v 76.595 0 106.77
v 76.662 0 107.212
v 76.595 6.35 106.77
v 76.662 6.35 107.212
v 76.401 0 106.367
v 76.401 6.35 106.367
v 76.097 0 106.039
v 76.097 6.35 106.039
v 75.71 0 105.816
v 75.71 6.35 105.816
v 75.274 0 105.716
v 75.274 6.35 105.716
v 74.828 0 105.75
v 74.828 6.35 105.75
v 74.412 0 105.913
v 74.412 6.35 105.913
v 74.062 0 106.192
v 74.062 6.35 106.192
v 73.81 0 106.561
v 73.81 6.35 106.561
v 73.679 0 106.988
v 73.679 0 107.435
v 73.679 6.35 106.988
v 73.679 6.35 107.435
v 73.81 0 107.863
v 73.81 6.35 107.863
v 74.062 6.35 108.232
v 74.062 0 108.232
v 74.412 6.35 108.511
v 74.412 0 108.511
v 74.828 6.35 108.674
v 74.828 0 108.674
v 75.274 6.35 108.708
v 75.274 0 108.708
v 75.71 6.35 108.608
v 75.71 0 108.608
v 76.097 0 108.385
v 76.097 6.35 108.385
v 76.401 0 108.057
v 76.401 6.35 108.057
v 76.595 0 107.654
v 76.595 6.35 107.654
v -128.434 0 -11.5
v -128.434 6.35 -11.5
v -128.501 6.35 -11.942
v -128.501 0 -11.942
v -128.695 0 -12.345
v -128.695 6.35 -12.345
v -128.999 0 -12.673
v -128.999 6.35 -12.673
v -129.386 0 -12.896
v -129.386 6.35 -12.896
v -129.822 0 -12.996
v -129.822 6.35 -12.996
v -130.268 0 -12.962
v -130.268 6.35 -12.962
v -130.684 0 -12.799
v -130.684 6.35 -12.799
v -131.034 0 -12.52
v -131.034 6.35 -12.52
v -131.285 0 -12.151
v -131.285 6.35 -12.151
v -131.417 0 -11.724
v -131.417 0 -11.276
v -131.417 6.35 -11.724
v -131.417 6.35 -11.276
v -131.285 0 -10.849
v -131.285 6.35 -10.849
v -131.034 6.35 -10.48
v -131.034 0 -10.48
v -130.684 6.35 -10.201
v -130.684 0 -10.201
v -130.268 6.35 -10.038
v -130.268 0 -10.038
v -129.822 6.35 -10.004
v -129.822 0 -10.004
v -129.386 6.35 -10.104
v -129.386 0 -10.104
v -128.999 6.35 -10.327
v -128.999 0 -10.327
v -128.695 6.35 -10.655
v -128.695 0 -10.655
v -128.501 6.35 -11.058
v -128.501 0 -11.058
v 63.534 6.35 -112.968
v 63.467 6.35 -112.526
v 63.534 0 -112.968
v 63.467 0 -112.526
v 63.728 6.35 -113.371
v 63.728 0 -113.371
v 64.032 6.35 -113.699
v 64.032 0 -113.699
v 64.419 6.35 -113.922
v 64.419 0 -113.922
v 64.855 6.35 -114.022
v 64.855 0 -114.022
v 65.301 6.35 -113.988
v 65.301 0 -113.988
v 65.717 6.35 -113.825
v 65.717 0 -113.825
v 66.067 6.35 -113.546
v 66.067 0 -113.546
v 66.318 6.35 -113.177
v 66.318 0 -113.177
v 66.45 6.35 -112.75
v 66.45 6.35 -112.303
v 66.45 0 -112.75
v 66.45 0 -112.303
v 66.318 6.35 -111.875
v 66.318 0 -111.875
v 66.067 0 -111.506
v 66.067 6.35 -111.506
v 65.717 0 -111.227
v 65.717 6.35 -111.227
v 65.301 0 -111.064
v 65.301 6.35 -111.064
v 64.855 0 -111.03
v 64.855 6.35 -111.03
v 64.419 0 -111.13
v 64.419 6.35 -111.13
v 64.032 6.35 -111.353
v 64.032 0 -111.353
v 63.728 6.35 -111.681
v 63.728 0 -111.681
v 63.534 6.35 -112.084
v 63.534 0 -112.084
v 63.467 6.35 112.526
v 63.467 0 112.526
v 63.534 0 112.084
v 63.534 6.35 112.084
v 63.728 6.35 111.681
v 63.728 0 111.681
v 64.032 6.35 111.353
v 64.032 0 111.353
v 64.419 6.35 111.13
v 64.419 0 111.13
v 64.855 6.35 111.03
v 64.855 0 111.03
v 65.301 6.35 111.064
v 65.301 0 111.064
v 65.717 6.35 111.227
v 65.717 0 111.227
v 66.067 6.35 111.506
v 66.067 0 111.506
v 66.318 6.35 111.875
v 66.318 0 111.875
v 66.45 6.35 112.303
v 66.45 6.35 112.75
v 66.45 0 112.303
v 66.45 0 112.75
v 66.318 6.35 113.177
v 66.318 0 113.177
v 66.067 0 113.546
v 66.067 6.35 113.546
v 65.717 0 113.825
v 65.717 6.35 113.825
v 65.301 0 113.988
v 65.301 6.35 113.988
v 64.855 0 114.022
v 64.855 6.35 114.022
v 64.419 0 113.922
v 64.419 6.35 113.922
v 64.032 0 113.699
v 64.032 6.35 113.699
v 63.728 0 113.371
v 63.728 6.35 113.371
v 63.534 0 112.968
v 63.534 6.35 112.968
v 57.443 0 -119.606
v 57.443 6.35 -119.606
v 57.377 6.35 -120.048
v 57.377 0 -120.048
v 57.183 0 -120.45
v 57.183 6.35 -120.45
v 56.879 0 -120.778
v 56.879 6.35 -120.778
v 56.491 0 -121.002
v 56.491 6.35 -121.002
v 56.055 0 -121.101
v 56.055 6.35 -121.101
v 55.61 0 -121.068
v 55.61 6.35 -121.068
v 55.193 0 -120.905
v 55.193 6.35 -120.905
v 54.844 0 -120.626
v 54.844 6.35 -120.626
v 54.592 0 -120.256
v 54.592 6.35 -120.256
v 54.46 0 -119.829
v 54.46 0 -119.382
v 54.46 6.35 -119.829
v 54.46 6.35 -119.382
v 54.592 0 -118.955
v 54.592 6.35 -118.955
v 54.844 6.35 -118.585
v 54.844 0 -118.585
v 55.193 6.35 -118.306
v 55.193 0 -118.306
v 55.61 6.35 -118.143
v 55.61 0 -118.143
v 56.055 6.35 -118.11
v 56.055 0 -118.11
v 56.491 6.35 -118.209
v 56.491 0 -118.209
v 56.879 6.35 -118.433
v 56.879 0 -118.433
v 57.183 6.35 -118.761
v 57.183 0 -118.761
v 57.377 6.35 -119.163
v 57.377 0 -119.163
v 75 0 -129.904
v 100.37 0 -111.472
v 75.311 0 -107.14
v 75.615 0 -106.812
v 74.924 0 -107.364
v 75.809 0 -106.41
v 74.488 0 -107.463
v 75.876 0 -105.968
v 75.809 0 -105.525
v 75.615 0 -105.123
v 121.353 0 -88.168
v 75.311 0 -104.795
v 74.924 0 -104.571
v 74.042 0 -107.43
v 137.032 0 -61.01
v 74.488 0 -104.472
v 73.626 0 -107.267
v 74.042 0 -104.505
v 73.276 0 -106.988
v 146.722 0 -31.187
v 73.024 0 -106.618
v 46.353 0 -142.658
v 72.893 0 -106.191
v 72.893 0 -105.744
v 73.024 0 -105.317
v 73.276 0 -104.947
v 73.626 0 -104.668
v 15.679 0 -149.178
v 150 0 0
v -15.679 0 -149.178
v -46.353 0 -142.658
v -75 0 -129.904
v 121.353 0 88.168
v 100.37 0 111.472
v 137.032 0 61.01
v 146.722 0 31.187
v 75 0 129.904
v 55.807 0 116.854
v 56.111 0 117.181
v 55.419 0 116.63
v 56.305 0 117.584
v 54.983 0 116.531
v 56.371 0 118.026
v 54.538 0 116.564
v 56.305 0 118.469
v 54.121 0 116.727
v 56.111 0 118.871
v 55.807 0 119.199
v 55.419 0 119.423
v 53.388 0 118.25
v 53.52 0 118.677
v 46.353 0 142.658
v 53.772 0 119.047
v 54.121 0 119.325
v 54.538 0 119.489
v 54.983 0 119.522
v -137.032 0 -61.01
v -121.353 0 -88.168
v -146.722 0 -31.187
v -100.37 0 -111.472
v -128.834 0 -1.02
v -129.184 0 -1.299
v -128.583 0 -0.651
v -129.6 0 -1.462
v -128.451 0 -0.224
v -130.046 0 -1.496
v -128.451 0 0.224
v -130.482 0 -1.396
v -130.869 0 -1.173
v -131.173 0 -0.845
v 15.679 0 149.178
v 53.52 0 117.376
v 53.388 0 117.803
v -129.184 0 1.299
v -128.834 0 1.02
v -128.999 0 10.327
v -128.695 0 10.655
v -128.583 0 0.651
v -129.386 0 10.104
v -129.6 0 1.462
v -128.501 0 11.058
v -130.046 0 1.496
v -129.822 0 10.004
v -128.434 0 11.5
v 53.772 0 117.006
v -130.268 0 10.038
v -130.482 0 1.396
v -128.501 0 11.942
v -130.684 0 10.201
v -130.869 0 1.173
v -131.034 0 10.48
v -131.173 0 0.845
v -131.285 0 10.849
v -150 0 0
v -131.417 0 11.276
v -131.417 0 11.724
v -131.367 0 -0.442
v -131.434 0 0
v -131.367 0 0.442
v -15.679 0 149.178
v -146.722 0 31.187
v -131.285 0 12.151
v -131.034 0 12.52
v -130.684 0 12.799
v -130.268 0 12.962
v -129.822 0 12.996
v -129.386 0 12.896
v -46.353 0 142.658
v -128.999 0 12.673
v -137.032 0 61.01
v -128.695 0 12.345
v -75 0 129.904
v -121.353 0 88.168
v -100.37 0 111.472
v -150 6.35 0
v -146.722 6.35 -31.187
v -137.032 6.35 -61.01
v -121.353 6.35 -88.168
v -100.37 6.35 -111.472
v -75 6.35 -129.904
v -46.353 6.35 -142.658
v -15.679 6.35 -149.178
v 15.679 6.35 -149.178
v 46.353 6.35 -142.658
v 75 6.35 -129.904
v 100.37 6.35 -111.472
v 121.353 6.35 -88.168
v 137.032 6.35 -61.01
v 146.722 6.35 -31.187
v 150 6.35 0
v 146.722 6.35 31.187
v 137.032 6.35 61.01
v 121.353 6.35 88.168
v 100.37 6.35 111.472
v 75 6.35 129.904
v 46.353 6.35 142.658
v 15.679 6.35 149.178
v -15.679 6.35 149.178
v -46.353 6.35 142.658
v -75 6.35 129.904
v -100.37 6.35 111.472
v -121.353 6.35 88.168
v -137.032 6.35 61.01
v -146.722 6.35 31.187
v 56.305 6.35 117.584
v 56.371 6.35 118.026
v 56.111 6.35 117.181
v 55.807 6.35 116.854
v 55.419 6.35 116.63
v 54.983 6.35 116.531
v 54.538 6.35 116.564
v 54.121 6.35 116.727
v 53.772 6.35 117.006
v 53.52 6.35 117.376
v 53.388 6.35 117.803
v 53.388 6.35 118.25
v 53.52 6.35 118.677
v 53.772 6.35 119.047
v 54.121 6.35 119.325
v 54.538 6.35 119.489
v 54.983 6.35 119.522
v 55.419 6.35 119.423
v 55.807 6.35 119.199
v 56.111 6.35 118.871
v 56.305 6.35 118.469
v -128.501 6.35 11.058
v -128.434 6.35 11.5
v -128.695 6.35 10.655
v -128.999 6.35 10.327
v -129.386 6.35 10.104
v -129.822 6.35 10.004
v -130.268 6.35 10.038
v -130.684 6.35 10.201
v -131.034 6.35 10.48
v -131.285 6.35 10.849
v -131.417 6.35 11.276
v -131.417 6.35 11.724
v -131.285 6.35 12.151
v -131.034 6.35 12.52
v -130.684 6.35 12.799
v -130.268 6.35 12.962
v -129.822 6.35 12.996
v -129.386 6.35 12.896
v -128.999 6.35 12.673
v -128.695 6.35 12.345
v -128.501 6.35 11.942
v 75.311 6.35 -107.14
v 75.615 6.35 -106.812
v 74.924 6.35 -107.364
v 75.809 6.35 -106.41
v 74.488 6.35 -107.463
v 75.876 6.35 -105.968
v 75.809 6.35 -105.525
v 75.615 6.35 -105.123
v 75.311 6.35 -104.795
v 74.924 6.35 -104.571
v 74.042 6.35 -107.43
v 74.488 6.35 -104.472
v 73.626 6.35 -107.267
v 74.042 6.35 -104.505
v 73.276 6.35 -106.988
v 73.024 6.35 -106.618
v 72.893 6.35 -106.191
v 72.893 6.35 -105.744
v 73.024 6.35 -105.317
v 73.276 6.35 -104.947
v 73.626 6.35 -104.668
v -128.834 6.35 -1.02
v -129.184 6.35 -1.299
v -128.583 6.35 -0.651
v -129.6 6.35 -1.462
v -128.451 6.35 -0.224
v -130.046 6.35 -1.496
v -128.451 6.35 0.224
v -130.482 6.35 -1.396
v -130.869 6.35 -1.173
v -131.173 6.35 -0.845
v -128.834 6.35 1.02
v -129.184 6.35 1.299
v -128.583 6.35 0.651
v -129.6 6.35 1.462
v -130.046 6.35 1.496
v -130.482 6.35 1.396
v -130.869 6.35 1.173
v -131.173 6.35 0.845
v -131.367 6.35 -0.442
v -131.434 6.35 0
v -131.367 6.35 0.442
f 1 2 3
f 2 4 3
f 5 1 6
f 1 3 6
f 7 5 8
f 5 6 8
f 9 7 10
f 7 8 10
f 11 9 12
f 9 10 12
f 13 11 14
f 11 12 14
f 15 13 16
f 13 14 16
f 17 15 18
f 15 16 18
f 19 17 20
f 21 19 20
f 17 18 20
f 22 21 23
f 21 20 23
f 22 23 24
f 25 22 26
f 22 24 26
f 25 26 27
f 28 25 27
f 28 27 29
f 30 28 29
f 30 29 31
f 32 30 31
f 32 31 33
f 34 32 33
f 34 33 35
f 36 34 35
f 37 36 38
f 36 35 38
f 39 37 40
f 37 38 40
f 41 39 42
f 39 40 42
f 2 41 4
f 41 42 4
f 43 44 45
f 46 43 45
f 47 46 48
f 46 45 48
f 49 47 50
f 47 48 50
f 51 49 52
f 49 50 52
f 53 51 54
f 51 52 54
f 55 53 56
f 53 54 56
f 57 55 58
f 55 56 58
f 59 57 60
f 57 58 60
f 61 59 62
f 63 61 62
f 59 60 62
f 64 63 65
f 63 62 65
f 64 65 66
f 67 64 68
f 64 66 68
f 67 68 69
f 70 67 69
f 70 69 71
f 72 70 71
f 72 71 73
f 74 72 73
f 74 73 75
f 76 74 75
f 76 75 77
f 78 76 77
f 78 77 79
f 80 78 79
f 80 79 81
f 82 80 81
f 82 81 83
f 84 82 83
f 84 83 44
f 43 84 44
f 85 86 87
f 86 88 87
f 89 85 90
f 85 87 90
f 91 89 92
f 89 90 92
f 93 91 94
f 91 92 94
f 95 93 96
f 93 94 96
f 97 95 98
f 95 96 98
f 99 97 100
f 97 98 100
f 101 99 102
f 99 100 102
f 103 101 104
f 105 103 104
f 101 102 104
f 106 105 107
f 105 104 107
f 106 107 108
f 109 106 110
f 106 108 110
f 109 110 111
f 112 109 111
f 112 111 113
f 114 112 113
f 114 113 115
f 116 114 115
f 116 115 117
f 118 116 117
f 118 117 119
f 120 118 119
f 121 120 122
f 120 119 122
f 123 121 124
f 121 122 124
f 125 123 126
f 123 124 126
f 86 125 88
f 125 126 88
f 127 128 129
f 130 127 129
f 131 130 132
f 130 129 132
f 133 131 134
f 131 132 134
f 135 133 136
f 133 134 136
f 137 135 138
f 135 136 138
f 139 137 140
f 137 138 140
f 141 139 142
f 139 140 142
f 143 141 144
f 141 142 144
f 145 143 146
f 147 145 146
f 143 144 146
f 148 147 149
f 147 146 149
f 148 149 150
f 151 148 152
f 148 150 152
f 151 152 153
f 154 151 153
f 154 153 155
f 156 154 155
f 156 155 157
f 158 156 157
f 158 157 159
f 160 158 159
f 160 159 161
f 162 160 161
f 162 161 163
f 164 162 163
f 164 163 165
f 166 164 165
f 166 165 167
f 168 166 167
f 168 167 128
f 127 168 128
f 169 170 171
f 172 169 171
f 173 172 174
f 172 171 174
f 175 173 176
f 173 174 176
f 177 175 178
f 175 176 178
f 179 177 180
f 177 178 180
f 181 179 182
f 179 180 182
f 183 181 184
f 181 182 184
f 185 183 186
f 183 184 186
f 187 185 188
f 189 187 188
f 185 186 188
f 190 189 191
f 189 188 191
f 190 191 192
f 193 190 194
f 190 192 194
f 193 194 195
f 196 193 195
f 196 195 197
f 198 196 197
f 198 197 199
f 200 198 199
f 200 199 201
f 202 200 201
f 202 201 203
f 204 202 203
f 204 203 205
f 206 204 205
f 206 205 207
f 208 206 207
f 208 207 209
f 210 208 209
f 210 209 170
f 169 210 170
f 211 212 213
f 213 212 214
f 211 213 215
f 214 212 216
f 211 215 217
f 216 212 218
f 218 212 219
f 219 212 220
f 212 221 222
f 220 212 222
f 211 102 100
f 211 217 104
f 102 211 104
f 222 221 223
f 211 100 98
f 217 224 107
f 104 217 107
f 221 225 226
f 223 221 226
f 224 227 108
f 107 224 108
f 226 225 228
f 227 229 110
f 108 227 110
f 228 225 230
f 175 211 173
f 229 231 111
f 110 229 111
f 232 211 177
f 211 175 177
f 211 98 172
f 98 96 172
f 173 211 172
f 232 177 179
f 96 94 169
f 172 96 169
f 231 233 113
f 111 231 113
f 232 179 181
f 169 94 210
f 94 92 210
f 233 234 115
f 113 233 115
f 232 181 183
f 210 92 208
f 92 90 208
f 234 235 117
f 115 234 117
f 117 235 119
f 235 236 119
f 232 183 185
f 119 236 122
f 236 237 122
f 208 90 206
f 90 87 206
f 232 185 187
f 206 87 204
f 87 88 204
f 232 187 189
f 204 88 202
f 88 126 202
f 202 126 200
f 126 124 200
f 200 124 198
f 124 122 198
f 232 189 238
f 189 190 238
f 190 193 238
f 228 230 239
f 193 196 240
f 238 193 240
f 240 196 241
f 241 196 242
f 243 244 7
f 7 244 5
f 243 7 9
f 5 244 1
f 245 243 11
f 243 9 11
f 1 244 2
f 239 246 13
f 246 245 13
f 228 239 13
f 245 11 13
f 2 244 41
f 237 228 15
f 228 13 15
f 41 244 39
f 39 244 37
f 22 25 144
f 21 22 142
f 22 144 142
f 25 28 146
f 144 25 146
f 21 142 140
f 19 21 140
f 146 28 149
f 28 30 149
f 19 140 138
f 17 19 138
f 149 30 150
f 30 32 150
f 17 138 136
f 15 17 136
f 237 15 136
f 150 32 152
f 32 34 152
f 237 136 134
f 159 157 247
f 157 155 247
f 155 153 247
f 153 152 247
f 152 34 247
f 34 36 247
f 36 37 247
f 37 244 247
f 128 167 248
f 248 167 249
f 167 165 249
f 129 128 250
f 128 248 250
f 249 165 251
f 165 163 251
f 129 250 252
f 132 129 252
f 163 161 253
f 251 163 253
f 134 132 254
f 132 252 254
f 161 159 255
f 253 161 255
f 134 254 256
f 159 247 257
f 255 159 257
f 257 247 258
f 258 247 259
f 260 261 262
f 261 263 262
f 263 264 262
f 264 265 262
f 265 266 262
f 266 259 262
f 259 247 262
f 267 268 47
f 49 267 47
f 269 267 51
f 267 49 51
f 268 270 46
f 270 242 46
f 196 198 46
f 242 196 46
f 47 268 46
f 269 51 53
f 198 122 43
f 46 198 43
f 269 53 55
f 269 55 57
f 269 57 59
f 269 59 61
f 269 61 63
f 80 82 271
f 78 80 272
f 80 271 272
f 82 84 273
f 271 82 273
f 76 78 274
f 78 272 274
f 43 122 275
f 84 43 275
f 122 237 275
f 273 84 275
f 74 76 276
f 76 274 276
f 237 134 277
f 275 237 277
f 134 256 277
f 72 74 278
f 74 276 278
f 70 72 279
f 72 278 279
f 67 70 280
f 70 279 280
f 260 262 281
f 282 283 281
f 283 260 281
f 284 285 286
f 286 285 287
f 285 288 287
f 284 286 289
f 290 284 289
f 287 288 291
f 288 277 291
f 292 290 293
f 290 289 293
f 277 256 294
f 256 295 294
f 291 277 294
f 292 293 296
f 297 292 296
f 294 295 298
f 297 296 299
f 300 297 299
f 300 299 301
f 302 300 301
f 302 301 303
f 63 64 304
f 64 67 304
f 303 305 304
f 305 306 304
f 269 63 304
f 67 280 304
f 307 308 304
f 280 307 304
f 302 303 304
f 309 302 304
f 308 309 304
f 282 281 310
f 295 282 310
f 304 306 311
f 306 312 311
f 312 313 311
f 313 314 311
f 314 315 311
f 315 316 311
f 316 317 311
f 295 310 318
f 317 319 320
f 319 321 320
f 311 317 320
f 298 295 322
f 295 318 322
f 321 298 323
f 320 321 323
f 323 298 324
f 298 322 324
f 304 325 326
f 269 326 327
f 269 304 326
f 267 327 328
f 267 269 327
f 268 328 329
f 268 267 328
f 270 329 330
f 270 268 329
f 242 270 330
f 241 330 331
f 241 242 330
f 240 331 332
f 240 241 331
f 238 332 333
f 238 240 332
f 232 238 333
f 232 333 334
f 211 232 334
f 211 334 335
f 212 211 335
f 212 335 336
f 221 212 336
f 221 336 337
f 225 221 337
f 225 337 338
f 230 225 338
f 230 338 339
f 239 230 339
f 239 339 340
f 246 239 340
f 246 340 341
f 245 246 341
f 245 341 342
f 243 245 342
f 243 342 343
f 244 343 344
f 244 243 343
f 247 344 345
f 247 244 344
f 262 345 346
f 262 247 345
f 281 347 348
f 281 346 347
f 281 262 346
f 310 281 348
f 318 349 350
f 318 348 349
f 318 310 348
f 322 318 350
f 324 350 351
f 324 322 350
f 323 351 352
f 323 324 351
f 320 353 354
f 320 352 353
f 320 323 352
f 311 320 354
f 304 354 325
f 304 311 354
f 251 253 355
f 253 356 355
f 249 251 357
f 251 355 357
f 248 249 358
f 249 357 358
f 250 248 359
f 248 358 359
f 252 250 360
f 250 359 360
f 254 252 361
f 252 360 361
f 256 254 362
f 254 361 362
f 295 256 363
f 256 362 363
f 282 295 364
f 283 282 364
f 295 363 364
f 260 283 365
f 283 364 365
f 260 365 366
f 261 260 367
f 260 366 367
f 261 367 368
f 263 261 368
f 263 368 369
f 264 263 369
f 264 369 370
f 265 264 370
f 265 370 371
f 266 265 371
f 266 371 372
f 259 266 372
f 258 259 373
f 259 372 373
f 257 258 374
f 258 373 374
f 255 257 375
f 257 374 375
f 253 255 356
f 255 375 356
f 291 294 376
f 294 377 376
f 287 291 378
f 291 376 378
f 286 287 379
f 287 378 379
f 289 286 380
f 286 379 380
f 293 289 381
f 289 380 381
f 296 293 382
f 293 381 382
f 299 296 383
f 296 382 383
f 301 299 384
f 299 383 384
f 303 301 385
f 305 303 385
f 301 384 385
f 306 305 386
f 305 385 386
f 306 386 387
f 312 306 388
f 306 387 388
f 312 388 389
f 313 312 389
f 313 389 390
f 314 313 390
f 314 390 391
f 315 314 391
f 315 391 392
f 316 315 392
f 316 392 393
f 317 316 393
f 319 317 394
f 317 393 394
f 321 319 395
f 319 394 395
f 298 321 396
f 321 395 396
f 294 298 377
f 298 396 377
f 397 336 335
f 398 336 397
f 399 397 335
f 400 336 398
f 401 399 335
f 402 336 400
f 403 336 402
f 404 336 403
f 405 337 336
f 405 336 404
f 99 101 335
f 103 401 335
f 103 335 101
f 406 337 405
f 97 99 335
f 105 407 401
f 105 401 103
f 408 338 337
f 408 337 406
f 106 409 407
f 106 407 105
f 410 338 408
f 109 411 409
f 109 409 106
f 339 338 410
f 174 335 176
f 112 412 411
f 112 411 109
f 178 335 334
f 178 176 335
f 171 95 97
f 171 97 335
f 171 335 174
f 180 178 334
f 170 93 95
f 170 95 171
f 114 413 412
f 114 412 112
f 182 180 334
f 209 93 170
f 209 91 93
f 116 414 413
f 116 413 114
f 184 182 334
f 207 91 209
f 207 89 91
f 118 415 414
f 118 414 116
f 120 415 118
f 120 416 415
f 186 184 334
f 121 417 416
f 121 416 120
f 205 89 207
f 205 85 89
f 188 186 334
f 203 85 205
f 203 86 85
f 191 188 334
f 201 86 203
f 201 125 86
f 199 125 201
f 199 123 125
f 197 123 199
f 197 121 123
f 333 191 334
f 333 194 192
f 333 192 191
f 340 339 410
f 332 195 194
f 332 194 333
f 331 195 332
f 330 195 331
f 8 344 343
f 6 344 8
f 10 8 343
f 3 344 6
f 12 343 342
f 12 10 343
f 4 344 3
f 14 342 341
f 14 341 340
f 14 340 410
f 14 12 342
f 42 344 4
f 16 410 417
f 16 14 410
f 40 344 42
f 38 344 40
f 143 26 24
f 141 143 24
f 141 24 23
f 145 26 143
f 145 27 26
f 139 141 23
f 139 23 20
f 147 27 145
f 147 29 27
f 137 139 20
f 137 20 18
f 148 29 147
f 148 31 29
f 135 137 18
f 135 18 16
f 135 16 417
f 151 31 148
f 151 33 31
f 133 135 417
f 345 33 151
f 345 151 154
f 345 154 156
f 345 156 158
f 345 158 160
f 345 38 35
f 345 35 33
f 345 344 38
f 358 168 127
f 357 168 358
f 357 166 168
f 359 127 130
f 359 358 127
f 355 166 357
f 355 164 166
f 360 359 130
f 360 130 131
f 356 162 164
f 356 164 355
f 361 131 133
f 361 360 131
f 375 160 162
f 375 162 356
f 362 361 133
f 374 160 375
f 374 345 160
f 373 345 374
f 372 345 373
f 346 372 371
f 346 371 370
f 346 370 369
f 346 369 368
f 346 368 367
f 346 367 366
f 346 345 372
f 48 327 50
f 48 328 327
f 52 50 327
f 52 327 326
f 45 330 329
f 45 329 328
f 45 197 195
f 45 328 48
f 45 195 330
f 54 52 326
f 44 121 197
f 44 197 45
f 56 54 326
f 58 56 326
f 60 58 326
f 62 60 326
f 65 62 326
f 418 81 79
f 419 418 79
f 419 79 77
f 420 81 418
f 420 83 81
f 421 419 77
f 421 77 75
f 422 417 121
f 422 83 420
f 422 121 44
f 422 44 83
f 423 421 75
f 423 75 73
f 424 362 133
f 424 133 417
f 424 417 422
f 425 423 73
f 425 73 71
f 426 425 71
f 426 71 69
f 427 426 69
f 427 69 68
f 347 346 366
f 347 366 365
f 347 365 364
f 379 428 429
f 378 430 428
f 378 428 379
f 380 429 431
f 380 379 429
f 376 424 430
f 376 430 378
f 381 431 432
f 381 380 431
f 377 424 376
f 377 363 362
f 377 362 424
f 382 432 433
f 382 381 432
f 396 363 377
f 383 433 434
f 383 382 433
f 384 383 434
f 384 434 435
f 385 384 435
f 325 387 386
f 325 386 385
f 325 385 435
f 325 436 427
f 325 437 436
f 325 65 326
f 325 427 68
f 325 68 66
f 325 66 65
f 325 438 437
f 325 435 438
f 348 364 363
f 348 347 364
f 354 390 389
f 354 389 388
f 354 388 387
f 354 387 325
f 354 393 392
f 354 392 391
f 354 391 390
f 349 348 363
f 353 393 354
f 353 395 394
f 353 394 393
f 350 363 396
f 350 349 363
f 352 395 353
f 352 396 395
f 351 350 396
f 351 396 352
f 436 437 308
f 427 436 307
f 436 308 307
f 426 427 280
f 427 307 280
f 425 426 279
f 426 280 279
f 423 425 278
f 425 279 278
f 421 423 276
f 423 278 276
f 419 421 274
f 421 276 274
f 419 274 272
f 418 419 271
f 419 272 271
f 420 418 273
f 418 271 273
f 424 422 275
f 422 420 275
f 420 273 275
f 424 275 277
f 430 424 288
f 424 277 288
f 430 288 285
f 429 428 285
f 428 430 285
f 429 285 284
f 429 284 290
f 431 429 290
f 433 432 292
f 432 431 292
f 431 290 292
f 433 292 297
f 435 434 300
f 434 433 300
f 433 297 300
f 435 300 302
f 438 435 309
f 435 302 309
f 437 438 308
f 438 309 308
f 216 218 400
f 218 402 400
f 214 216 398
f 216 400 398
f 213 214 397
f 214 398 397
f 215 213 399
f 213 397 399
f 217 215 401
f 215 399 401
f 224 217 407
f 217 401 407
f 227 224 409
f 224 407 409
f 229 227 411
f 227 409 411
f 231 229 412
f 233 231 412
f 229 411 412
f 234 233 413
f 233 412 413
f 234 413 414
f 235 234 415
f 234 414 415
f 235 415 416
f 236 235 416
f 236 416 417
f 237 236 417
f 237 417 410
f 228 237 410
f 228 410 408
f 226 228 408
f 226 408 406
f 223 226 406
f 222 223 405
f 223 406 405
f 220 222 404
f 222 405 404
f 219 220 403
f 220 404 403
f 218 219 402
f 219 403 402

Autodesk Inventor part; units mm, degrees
ref_plane "YZ Plane" through (0, 0, 0) normal (1, 0, 0) x (0, 1, 0)
ref_plane "XZ Plane" through (0, 0, 0) normal (0, 1, 0) x (-1, 0, 0)
ref_plane "XY Plane" through (0, 0, 0) normal (0, 0, 1) x (1, 0, 0)
sketch "Sketch1" plane through (0, 0, 0) normal (0, 1, 0) x (-1, 0, 0)
  circle A0 centre (0, 0) radius 150
  line L0 (150, 0) -> (0, 0)
  line L1 (0, 0) -> (-75, -129.9038)
  line L2 (0, 0) -> (150, 0) construction
  line L3 (0, 0) -> (-75, 129.9038)
  line L4 (0, 0) -> (150, 0) construction
  line L5 (-75, 129.9038) -> (-74.5, 129.0378)
  line L6 (-74.5, 129.0378) -> (-69.335, 120.0917)
  line L7 (-75, 129.9038) -> (-64.967, 112.5261)
  circle A1 centre (-64.967, 112.5261) radius 1.5
  line L8 (150, 0) -> (129.934, 0)
  circle A2 centre (129.934, 0) radius 1.5
  line L9 (-75, -129.9038) -> (-64.967, -112.5261)
  circle A3 centre (-64.967, -112.5261) radius 1.5
  dimension "d20" = 300
  dimension "d22" = 120
  dimension "d23" = 120
  dimension "d24" = 1
  dimension "d25" = 10.33
  dimension "d26" = 20.066
  dimension "d27" = 3
  dimension "d28" = 20.066
  dimension "d29" = 3
  dimension "d30" = 20.066
  dimension "d31" = 3
extrude "Extrusion1" add sketch "Sketch1" along normal blind 6.35 contours L0 A2 L3 A1 A0 | A0 L1 A3 L0 A2 | L3 A1 L1 A3 A0
sketch "Sketch2" plane through (0, 6.35, 0) normal (0, 1, 0) x (1, 0, 0)
  circle A0 centre (-129.934, 0) radius 1.5 projected
  line L0 (-129.934, -1.5) -> (-129.934, -11.5)
  line L1 (-129.934, 1.5) -> (-129.934, 11.5)
  circle A1 centre (-129.934, -11.5) radius 1.5
  circle A2 centre (-129.934, 11.5) radius 1.5
  circle A3 centre (64.967, -112.5261) radius 1.5 projected
  line L2 (63.6961, -113.3229) -> (54.8713, -118.0264)
  line L3 (54.8713, -118.0264) -> (66.337, -111.9154)
  line L4 (66.337, -111.9154) -> (75.1618, -107.2119)
  circle A4 centre (54.8713, -118.0264) radius 1.5
  circle A5 centre (75.1618, -107.2119) radius 1.5
  circle A6 centre (64.967, 112.5261) radius 1.5 projected
  line L5 (66.337, 111.9154) -> (74.3759, 105.9675)
  line L6 (74.3759, 105.9675) -> (63.9823, 113.6576)
  line L7 (63.9823, 113.6576) -> (55.9434, 119.6055)
  circle A7 centre (55.9434, 119.6055) radius 1.5
  circle A8 centre (74.3759, 105.9675) radius 1.5
  point P0 (0, 0)
  dimension "d36" = 10
  dimension "d37" = 10
  dimension "d38" = 3
  dimension "d39" = 3
  dimension "d40" = 10
  dimension "d41" = 10
  dimension "d42" = 3
  dimension "d43" = 3
  dimension "d44" = 10
  dimension "d45" = 10
  dimension "d46" = 3
  dimension "d47" = 3
extrude "Extrusion3" cut sketch "Sketch2" against normal through all contours A1 | A2 | A4 | A5 | A8 | A7
sketch "Sketch7" plane through (0, 6.35, 0) normal (0, 1, 0) x (1, 0, 0)
  circle A0 centre (0, 0) radius 150 projected
  line L0 (150, 0) -> (-150, 0)
properties part number "plate support" material "Polycarbonat, klar"
